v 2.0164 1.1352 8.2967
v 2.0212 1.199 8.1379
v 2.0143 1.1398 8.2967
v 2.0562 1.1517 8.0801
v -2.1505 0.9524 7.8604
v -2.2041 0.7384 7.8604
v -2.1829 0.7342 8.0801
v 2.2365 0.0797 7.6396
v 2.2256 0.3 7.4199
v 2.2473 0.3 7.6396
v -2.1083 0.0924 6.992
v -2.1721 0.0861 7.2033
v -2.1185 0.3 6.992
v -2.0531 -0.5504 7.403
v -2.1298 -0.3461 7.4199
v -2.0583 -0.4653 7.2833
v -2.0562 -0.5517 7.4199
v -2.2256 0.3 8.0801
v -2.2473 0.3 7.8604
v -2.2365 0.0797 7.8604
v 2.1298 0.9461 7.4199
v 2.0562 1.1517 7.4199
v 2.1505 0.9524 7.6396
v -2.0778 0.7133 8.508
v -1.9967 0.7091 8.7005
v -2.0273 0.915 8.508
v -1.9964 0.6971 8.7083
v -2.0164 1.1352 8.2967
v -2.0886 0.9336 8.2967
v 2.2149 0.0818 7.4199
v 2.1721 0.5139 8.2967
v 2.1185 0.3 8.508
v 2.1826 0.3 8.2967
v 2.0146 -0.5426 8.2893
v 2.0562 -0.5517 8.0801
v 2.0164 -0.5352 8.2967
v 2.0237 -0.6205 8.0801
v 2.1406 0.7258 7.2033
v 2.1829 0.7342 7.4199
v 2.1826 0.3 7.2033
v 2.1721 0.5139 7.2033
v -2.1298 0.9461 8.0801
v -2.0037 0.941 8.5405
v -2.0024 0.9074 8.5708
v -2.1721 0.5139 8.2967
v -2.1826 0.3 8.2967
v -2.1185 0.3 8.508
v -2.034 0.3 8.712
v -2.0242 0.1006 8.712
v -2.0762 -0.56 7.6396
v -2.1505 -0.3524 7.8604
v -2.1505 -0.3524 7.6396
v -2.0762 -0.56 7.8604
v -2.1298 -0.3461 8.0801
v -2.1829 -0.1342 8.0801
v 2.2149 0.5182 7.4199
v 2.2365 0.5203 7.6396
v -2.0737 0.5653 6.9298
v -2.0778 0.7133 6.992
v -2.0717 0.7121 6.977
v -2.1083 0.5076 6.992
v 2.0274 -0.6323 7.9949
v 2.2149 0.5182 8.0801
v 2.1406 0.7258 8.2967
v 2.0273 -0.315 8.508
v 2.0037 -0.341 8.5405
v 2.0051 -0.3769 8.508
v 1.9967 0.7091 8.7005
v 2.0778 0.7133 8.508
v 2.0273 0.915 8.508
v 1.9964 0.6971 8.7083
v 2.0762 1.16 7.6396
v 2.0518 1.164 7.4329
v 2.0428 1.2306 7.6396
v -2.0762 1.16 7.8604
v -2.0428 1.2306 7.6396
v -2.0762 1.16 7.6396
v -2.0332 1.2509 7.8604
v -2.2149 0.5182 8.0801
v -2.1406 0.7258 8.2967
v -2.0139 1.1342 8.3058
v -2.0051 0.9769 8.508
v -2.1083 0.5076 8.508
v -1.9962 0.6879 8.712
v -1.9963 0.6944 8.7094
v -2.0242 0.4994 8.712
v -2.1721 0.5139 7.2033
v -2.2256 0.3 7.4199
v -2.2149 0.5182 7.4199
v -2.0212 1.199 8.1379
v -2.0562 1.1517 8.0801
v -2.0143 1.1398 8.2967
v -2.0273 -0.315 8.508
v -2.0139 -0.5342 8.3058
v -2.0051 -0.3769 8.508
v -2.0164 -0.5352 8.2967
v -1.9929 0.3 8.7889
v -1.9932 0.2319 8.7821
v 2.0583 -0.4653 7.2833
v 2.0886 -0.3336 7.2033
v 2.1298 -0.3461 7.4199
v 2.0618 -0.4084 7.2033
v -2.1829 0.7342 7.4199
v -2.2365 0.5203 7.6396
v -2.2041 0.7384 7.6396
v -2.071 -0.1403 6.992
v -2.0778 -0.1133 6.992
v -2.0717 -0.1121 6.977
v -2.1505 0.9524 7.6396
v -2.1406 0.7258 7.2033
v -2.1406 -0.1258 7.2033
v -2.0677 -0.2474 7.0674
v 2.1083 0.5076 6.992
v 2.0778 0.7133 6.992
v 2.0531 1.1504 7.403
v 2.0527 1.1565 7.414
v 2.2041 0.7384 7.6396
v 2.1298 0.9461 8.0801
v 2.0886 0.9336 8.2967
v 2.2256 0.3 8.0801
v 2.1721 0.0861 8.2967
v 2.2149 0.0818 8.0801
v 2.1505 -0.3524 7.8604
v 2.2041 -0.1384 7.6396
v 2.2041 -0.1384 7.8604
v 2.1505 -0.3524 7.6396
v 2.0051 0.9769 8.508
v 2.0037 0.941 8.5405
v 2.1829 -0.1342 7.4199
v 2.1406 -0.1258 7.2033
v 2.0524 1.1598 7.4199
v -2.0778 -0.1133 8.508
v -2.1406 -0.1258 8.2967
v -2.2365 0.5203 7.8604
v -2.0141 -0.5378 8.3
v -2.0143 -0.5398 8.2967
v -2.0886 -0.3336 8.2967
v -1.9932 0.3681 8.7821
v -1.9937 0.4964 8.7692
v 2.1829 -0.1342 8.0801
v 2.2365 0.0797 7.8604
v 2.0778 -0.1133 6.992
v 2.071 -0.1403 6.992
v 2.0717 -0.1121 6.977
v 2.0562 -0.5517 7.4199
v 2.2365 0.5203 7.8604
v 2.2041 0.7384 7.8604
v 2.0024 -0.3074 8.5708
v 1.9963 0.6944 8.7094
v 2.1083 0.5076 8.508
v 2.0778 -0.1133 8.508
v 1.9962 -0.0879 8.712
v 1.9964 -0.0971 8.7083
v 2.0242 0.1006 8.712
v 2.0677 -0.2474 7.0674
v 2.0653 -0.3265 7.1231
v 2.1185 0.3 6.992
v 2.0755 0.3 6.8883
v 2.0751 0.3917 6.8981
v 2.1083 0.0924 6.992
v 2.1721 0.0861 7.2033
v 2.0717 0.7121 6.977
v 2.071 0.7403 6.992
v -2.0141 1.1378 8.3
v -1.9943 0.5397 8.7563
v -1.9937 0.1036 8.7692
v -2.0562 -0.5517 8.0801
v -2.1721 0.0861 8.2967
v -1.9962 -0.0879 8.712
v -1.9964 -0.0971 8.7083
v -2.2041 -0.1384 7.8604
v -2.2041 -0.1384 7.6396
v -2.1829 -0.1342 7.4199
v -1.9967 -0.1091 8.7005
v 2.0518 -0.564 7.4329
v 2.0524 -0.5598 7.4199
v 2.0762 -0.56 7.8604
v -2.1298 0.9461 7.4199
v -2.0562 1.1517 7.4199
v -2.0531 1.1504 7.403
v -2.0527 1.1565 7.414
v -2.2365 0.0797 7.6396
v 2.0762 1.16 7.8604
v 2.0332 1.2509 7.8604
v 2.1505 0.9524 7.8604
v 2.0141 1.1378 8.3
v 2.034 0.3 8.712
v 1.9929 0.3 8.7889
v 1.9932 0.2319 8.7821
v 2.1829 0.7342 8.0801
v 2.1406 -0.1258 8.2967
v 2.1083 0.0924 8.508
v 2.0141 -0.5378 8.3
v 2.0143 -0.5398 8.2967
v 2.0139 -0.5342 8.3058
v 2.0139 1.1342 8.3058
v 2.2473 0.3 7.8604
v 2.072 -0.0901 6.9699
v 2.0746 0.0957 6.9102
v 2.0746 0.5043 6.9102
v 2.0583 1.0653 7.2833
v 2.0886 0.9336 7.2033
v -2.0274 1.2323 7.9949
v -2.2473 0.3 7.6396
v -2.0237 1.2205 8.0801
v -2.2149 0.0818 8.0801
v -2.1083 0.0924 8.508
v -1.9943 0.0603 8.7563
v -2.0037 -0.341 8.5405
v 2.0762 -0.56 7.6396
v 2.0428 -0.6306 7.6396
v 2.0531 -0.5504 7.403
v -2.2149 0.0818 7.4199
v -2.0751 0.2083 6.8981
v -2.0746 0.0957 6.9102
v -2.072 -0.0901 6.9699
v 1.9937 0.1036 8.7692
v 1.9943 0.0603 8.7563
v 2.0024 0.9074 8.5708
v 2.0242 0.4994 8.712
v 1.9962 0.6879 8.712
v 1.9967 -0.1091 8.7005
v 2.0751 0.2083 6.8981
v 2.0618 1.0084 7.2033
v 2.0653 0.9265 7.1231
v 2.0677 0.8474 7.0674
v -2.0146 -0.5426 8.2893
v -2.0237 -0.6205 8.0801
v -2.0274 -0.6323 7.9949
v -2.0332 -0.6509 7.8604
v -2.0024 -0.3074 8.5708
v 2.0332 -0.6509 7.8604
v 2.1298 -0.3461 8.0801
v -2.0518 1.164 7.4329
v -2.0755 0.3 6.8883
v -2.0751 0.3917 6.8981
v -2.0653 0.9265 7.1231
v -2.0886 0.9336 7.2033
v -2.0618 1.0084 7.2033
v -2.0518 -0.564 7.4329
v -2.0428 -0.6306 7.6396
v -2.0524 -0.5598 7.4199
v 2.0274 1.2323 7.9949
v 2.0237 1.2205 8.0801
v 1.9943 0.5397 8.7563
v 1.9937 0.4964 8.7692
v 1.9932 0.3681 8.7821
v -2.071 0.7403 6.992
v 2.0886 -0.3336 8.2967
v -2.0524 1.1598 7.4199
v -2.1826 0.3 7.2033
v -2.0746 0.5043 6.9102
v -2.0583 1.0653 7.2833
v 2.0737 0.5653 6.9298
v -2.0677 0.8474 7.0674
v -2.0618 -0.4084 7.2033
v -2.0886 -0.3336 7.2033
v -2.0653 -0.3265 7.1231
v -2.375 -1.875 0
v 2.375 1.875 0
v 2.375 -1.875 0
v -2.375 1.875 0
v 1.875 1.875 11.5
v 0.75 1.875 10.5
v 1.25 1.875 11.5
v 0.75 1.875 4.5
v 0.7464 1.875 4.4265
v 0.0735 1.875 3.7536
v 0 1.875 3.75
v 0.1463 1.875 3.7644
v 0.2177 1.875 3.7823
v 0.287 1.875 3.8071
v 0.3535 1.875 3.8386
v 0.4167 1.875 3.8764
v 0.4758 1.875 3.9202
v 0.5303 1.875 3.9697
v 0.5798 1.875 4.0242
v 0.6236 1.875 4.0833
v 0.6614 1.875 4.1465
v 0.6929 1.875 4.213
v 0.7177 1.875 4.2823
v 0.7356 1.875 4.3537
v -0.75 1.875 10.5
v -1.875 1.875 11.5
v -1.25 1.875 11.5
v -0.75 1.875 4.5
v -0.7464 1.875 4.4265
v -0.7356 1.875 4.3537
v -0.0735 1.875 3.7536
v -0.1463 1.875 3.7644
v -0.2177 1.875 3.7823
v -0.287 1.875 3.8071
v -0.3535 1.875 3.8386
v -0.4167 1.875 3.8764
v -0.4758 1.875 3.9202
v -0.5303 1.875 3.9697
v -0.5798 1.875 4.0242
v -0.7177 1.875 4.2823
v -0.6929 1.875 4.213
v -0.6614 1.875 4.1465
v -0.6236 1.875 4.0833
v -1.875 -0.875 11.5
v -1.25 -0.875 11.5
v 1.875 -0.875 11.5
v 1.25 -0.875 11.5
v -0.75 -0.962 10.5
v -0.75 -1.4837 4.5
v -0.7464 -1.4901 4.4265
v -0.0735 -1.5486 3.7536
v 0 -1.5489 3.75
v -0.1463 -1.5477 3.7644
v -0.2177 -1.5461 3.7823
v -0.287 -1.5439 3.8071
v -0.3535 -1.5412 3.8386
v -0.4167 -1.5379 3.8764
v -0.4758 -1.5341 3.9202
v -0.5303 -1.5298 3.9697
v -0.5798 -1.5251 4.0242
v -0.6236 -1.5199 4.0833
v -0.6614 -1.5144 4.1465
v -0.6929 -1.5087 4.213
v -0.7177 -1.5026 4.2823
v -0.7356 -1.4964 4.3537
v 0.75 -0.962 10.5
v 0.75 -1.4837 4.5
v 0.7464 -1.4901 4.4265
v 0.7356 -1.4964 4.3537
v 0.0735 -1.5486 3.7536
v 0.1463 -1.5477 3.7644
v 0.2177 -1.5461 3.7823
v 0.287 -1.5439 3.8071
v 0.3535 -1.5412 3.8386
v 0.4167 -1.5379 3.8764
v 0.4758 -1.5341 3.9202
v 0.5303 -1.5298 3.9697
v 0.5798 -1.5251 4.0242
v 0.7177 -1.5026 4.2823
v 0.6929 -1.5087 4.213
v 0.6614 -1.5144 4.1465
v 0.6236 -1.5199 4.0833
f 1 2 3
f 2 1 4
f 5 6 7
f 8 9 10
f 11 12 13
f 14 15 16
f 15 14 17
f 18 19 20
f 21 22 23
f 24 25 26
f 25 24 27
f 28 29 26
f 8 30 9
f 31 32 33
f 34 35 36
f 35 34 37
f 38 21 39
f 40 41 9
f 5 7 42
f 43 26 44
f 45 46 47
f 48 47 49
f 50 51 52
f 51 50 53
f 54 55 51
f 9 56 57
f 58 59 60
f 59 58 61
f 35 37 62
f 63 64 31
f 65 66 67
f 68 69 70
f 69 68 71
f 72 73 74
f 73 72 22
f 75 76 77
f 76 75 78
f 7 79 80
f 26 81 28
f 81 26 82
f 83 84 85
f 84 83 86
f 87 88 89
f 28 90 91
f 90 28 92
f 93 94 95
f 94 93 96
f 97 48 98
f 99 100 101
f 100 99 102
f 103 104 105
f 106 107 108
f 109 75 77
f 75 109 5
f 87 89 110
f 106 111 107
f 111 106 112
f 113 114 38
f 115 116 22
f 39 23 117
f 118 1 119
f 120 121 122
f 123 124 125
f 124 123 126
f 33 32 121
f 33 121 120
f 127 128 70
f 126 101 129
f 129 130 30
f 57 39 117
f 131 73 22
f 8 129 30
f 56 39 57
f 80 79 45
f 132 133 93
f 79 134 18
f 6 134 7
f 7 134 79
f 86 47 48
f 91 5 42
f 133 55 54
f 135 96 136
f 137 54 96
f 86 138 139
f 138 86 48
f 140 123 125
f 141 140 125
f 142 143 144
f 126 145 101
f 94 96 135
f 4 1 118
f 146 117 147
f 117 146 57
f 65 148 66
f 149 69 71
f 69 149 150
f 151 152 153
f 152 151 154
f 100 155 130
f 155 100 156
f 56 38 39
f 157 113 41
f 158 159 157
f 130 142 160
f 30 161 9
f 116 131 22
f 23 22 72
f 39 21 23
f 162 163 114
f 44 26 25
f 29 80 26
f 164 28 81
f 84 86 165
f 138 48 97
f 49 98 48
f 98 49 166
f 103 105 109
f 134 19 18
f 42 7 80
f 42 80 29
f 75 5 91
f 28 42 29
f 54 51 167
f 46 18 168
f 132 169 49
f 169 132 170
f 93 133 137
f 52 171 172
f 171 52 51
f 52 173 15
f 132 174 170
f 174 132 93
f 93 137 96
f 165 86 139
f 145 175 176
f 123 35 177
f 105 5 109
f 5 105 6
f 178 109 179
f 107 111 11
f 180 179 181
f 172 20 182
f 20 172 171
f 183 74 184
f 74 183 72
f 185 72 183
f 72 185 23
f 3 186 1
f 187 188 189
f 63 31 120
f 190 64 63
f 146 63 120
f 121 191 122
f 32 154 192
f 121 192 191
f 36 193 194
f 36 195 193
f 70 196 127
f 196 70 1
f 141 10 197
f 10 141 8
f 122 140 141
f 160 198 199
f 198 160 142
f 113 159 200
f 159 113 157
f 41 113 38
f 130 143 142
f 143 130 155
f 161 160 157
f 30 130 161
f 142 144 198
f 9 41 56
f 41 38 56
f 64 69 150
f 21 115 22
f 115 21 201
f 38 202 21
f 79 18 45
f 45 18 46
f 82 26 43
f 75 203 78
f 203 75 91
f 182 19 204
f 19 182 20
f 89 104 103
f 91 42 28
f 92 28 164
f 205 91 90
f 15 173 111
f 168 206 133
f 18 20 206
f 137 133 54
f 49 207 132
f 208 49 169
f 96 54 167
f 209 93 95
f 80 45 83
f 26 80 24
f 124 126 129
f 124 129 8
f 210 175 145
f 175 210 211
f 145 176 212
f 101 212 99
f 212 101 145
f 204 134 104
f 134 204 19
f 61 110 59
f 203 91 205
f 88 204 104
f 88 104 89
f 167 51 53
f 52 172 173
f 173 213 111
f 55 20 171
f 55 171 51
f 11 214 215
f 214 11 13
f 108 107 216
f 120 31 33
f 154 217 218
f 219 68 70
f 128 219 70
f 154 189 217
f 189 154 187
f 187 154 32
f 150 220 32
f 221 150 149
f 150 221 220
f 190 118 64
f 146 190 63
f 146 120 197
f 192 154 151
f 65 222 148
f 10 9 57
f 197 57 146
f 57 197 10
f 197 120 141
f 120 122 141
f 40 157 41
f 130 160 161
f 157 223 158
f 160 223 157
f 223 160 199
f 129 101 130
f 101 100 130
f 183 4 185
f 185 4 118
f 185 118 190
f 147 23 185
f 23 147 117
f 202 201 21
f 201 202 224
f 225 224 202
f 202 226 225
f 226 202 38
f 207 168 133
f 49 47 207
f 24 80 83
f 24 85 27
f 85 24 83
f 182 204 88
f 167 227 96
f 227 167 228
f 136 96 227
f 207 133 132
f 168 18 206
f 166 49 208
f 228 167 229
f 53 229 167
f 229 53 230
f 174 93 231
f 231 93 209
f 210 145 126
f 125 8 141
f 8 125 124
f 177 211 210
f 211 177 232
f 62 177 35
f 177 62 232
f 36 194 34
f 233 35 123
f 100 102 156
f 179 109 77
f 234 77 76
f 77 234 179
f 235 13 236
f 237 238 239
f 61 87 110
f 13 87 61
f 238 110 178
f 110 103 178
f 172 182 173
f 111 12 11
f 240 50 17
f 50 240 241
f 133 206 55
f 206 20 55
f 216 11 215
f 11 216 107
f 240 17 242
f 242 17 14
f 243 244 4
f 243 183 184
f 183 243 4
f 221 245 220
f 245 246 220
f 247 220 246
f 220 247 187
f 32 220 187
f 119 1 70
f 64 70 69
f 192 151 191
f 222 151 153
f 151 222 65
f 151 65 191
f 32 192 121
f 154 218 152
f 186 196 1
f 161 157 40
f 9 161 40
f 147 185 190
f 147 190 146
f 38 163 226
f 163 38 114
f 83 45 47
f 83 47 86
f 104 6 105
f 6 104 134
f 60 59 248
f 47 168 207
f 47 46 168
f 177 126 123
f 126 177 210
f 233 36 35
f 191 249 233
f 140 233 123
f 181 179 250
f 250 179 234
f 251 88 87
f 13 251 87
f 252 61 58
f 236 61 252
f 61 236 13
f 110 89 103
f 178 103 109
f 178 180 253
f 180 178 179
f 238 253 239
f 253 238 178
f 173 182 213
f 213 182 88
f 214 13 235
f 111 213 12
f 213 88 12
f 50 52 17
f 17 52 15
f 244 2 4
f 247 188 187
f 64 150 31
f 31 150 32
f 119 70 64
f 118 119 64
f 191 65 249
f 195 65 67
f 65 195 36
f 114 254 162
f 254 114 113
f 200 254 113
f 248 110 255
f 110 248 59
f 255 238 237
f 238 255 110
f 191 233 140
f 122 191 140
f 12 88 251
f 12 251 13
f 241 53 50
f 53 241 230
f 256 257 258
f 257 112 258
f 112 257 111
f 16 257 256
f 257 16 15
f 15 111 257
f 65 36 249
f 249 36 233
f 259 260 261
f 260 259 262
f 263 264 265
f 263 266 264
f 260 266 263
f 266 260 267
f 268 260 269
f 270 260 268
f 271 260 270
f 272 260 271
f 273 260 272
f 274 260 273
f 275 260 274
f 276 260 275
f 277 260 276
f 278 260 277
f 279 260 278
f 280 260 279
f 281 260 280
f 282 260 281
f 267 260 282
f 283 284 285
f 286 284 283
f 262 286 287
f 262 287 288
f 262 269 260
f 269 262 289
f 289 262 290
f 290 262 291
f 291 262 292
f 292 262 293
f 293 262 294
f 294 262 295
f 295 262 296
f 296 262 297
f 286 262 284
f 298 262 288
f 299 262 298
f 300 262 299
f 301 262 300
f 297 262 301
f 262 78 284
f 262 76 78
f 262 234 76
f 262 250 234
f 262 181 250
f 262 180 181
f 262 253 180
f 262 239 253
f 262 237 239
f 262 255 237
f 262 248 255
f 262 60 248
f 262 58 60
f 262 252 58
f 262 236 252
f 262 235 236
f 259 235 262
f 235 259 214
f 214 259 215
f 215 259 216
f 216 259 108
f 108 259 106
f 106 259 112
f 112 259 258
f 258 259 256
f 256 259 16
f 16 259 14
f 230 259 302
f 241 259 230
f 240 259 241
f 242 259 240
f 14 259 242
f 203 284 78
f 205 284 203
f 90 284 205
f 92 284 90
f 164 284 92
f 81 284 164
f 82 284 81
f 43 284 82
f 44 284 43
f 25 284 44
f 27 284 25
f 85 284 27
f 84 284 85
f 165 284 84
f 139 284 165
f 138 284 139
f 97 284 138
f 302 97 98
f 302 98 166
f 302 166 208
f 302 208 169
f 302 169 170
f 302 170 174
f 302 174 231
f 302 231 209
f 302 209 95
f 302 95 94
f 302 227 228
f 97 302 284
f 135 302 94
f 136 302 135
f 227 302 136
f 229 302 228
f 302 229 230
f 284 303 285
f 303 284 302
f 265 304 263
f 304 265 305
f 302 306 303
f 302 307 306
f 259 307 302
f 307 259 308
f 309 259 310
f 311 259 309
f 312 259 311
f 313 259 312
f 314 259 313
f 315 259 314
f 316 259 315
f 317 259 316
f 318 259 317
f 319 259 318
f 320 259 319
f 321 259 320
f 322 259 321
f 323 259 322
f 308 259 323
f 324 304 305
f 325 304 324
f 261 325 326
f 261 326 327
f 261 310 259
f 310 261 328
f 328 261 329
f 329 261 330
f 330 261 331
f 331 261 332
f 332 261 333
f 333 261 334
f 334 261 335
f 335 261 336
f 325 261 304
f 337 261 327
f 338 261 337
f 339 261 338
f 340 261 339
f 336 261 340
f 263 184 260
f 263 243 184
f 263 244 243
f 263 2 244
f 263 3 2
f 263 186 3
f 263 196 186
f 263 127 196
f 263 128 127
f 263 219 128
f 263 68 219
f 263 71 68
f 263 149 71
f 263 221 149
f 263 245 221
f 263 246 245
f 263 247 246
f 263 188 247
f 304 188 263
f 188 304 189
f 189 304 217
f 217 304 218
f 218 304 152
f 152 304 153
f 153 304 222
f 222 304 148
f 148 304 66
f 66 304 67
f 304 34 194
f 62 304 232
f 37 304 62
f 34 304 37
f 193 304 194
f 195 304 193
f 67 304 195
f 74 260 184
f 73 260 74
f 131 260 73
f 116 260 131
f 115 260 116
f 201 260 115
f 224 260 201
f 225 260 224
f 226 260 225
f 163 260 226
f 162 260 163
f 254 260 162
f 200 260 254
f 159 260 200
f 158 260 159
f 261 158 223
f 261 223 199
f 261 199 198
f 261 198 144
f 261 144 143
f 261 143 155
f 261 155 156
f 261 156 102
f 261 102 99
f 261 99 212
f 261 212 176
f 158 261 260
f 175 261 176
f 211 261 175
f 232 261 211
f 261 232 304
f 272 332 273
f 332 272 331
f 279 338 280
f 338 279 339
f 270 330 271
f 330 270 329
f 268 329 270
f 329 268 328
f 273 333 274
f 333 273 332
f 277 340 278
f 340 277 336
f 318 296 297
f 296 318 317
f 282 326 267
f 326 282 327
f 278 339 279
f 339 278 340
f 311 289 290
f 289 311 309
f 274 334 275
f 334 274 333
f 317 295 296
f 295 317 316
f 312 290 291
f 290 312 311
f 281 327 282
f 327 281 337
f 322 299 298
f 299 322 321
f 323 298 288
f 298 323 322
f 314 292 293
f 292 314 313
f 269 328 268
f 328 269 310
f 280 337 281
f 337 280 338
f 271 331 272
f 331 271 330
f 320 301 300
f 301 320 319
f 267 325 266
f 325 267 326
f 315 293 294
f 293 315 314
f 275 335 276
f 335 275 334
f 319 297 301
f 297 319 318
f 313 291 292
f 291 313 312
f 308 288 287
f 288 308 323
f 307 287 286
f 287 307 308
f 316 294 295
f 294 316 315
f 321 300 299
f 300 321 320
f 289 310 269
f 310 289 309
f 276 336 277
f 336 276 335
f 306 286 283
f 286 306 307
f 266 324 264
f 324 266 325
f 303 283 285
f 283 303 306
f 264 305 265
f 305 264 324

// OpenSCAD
$fn=64;
module wedge(b=[1,1],t=[1,1],h=10,to=[0,0])
{
    hull()
    {
        cube([b[0],b[1],0.00001],true);
        
        translate([to[0],to[1],h])
            cube([t[0],t[1],0.00001],true);
    };
}
difference()
{
union()
    {
        wedge([4.75,3.75],[3.75,2.75],11.5,[0,0.5]);
        intersection()
        {
        translate([0,0.3,7.75])sphere(4.5/2,true);
            translate([0,0.3,0])cube([100,2.2,100],true);
        }
    }
translate([0,0,11.5-7])
    {
        translate([0,5,0])rotate([90,0,0])cylinder(h=10,r=1.5/2);
        wedge([1.5,5.75],[1.5,3.75],8,[0,0.5]);
    }
    
translate([0,0,11.5-1])
    {
        wedge([1.5,5.75],[2.5,5.75],1,[0,0.5]);
    }
}
